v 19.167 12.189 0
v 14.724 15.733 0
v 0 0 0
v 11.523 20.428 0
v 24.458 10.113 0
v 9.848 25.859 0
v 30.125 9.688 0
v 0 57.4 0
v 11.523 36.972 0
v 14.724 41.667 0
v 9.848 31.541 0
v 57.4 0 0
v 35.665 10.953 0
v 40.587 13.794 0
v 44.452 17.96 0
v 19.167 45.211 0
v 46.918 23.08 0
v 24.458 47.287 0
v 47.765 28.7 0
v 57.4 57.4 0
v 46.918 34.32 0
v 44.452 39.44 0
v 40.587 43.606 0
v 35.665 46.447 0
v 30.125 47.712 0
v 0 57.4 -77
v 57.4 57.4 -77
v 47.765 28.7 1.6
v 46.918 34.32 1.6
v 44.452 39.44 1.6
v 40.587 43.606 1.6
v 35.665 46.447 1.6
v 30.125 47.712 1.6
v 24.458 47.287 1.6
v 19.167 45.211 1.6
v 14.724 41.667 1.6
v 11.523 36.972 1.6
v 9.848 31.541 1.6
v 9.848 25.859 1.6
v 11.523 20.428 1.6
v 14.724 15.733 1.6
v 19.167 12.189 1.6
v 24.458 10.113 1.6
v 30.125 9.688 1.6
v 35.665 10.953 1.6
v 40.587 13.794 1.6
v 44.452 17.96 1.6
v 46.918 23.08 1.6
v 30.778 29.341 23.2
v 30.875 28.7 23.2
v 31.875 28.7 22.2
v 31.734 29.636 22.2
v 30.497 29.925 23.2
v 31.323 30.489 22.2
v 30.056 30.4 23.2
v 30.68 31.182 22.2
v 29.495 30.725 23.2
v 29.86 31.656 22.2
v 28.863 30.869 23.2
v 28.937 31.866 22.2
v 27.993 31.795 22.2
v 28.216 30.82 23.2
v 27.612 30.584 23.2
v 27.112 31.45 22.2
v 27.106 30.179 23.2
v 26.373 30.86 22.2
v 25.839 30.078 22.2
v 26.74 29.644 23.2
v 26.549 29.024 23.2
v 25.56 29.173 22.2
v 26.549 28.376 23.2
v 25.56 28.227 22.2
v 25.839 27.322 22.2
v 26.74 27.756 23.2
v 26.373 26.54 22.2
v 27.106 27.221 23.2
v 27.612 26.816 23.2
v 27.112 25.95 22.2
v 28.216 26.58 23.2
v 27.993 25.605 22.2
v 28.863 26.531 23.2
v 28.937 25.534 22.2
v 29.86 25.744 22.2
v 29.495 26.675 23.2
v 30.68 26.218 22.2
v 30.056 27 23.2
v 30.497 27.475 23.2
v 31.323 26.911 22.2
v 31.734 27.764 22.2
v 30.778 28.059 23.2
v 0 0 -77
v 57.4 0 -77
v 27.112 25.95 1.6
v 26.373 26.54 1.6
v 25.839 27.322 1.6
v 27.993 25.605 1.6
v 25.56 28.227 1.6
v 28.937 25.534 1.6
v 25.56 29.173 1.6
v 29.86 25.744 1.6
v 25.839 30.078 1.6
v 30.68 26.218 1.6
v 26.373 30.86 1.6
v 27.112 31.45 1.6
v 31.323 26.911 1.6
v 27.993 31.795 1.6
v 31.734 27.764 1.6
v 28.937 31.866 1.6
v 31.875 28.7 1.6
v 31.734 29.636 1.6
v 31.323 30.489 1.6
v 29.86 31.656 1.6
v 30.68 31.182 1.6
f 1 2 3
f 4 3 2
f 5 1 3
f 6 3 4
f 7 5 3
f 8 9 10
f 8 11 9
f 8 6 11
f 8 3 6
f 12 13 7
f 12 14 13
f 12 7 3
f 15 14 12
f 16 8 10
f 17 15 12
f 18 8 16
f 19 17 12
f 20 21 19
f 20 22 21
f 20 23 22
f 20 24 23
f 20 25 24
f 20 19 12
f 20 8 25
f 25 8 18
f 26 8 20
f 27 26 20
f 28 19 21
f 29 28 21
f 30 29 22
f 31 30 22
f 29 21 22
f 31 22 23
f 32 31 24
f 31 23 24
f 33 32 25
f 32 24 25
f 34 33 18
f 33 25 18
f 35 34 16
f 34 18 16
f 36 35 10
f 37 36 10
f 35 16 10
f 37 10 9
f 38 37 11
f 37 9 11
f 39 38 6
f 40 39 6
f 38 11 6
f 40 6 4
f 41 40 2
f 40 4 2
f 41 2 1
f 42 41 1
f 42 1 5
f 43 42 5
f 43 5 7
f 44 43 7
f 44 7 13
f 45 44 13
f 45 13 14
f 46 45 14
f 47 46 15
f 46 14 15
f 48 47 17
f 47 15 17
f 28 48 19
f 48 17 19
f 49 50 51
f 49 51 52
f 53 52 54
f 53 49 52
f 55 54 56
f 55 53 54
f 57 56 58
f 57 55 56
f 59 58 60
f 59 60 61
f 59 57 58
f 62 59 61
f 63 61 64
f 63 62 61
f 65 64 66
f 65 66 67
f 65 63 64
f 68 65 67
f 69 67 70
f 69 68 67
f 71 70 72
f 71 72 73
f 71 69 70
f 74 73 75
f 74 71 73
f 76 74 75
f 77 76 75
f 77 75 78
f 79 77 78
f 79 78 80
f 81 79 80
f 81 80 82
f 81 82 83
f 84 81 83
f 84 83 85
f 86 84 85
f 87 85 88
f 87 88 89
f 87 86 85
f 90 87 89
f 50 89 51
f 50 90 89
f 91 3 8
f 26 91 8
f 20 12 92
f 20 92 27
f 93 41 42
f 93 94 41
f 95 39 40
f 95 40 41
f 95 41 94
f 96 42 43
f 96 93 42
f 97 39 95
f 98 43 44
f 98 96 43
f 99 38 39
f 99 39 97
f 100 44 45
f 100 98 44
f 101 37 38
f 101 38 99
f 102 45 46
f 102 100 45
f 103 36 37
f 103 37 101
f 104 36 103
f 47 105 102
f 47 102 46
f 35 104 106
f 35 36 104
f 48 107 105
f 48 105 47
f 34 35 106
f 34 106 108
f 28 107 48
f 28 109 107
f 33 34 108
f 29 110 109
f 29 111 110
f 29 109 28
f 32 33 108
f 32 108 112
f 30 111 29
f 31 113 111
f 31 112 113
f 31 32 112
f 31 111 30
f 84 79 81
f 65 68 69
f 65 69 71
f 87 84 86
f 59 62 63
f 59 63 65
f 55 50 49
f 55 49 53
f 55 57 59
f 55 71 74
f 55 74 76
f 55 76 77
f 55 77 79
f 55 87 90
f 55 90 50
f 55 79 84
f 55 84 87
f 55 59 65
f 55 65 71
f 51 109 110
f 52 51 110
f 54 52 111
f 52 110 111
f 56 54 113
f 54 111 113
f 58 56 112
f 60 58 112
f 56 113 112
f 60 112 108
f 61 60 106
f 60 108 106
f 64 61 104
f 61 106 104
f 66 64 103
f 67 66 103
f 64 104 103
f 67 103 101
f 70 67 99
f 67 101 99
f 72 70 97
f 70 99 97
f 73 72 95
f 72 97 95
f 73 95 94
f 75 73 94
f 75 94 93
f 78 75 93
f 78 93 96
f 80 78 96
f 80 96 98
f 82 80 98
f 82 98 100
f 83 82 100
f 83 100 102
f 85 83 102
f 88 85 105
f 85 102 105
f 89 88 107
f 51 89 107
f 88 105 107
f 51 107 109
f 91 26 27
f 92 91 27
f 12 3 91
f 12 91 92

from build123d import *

# Parameters (mm, degrees)
SKIZZE1_W                       = 57.4
SKIZZE1_H                       = 57.4
AUFSATZ_LINEAR_AUSTRAGEN1_DEPTH = 77
SKIZZE2_R                       = 19.065
AUFSATZ_LINEAR_AUSTRAGEN2_DEPTH = 1.6
SKIZZE3_R                       = 3.175
AUFSATZ_LINEAR_AUSTRAGEN3_DEPTH = 21.6
FASE1_SIZE                      = 1


with BuildPart() as part:
    # Skizze1 → Aufsatz-Linear austragen1 (new body)
    with BuildSketch(Plane.XY):
        with Locations((28.7, 28.7)):
            Rectangle(SKIZZE1_W, SKIZZE1_H)
    extrude(amount=-AUFSATZ_LINEAR_AUSTRAGEN1_DEPTH)

    # Skizze2 → Aufsatz-Linear austragen2 (add)
    with BuildSketch(Plane.XY):
        with Locations((28.7, 28.7)):
            Circle(SKIZZE2_R)
    extrude(amount=AUFSATZ_LINEAR_AUSTRAGEN2_DEPTH)

    # Skizze3 → Aufsatz-Linear austragen3 (add)
    with BuildSketch(Plane.XY.offset(1.6)):
        with Locations((28.7, 28.7)):
            Circle(SKIZZE3_R)
    extrude(amount=AUFSATZ_LINEAR_AUSTRAGEN3_DEPTH)

    # Fase1
    fase1_edges = [part.edges().sort_by_distance(p)[0] for p in [
        (25.525, 28.7, 23.2),
    ]]
    chamfer(fase1_edges, length=FASE1_SIZE)


solid = part.part
